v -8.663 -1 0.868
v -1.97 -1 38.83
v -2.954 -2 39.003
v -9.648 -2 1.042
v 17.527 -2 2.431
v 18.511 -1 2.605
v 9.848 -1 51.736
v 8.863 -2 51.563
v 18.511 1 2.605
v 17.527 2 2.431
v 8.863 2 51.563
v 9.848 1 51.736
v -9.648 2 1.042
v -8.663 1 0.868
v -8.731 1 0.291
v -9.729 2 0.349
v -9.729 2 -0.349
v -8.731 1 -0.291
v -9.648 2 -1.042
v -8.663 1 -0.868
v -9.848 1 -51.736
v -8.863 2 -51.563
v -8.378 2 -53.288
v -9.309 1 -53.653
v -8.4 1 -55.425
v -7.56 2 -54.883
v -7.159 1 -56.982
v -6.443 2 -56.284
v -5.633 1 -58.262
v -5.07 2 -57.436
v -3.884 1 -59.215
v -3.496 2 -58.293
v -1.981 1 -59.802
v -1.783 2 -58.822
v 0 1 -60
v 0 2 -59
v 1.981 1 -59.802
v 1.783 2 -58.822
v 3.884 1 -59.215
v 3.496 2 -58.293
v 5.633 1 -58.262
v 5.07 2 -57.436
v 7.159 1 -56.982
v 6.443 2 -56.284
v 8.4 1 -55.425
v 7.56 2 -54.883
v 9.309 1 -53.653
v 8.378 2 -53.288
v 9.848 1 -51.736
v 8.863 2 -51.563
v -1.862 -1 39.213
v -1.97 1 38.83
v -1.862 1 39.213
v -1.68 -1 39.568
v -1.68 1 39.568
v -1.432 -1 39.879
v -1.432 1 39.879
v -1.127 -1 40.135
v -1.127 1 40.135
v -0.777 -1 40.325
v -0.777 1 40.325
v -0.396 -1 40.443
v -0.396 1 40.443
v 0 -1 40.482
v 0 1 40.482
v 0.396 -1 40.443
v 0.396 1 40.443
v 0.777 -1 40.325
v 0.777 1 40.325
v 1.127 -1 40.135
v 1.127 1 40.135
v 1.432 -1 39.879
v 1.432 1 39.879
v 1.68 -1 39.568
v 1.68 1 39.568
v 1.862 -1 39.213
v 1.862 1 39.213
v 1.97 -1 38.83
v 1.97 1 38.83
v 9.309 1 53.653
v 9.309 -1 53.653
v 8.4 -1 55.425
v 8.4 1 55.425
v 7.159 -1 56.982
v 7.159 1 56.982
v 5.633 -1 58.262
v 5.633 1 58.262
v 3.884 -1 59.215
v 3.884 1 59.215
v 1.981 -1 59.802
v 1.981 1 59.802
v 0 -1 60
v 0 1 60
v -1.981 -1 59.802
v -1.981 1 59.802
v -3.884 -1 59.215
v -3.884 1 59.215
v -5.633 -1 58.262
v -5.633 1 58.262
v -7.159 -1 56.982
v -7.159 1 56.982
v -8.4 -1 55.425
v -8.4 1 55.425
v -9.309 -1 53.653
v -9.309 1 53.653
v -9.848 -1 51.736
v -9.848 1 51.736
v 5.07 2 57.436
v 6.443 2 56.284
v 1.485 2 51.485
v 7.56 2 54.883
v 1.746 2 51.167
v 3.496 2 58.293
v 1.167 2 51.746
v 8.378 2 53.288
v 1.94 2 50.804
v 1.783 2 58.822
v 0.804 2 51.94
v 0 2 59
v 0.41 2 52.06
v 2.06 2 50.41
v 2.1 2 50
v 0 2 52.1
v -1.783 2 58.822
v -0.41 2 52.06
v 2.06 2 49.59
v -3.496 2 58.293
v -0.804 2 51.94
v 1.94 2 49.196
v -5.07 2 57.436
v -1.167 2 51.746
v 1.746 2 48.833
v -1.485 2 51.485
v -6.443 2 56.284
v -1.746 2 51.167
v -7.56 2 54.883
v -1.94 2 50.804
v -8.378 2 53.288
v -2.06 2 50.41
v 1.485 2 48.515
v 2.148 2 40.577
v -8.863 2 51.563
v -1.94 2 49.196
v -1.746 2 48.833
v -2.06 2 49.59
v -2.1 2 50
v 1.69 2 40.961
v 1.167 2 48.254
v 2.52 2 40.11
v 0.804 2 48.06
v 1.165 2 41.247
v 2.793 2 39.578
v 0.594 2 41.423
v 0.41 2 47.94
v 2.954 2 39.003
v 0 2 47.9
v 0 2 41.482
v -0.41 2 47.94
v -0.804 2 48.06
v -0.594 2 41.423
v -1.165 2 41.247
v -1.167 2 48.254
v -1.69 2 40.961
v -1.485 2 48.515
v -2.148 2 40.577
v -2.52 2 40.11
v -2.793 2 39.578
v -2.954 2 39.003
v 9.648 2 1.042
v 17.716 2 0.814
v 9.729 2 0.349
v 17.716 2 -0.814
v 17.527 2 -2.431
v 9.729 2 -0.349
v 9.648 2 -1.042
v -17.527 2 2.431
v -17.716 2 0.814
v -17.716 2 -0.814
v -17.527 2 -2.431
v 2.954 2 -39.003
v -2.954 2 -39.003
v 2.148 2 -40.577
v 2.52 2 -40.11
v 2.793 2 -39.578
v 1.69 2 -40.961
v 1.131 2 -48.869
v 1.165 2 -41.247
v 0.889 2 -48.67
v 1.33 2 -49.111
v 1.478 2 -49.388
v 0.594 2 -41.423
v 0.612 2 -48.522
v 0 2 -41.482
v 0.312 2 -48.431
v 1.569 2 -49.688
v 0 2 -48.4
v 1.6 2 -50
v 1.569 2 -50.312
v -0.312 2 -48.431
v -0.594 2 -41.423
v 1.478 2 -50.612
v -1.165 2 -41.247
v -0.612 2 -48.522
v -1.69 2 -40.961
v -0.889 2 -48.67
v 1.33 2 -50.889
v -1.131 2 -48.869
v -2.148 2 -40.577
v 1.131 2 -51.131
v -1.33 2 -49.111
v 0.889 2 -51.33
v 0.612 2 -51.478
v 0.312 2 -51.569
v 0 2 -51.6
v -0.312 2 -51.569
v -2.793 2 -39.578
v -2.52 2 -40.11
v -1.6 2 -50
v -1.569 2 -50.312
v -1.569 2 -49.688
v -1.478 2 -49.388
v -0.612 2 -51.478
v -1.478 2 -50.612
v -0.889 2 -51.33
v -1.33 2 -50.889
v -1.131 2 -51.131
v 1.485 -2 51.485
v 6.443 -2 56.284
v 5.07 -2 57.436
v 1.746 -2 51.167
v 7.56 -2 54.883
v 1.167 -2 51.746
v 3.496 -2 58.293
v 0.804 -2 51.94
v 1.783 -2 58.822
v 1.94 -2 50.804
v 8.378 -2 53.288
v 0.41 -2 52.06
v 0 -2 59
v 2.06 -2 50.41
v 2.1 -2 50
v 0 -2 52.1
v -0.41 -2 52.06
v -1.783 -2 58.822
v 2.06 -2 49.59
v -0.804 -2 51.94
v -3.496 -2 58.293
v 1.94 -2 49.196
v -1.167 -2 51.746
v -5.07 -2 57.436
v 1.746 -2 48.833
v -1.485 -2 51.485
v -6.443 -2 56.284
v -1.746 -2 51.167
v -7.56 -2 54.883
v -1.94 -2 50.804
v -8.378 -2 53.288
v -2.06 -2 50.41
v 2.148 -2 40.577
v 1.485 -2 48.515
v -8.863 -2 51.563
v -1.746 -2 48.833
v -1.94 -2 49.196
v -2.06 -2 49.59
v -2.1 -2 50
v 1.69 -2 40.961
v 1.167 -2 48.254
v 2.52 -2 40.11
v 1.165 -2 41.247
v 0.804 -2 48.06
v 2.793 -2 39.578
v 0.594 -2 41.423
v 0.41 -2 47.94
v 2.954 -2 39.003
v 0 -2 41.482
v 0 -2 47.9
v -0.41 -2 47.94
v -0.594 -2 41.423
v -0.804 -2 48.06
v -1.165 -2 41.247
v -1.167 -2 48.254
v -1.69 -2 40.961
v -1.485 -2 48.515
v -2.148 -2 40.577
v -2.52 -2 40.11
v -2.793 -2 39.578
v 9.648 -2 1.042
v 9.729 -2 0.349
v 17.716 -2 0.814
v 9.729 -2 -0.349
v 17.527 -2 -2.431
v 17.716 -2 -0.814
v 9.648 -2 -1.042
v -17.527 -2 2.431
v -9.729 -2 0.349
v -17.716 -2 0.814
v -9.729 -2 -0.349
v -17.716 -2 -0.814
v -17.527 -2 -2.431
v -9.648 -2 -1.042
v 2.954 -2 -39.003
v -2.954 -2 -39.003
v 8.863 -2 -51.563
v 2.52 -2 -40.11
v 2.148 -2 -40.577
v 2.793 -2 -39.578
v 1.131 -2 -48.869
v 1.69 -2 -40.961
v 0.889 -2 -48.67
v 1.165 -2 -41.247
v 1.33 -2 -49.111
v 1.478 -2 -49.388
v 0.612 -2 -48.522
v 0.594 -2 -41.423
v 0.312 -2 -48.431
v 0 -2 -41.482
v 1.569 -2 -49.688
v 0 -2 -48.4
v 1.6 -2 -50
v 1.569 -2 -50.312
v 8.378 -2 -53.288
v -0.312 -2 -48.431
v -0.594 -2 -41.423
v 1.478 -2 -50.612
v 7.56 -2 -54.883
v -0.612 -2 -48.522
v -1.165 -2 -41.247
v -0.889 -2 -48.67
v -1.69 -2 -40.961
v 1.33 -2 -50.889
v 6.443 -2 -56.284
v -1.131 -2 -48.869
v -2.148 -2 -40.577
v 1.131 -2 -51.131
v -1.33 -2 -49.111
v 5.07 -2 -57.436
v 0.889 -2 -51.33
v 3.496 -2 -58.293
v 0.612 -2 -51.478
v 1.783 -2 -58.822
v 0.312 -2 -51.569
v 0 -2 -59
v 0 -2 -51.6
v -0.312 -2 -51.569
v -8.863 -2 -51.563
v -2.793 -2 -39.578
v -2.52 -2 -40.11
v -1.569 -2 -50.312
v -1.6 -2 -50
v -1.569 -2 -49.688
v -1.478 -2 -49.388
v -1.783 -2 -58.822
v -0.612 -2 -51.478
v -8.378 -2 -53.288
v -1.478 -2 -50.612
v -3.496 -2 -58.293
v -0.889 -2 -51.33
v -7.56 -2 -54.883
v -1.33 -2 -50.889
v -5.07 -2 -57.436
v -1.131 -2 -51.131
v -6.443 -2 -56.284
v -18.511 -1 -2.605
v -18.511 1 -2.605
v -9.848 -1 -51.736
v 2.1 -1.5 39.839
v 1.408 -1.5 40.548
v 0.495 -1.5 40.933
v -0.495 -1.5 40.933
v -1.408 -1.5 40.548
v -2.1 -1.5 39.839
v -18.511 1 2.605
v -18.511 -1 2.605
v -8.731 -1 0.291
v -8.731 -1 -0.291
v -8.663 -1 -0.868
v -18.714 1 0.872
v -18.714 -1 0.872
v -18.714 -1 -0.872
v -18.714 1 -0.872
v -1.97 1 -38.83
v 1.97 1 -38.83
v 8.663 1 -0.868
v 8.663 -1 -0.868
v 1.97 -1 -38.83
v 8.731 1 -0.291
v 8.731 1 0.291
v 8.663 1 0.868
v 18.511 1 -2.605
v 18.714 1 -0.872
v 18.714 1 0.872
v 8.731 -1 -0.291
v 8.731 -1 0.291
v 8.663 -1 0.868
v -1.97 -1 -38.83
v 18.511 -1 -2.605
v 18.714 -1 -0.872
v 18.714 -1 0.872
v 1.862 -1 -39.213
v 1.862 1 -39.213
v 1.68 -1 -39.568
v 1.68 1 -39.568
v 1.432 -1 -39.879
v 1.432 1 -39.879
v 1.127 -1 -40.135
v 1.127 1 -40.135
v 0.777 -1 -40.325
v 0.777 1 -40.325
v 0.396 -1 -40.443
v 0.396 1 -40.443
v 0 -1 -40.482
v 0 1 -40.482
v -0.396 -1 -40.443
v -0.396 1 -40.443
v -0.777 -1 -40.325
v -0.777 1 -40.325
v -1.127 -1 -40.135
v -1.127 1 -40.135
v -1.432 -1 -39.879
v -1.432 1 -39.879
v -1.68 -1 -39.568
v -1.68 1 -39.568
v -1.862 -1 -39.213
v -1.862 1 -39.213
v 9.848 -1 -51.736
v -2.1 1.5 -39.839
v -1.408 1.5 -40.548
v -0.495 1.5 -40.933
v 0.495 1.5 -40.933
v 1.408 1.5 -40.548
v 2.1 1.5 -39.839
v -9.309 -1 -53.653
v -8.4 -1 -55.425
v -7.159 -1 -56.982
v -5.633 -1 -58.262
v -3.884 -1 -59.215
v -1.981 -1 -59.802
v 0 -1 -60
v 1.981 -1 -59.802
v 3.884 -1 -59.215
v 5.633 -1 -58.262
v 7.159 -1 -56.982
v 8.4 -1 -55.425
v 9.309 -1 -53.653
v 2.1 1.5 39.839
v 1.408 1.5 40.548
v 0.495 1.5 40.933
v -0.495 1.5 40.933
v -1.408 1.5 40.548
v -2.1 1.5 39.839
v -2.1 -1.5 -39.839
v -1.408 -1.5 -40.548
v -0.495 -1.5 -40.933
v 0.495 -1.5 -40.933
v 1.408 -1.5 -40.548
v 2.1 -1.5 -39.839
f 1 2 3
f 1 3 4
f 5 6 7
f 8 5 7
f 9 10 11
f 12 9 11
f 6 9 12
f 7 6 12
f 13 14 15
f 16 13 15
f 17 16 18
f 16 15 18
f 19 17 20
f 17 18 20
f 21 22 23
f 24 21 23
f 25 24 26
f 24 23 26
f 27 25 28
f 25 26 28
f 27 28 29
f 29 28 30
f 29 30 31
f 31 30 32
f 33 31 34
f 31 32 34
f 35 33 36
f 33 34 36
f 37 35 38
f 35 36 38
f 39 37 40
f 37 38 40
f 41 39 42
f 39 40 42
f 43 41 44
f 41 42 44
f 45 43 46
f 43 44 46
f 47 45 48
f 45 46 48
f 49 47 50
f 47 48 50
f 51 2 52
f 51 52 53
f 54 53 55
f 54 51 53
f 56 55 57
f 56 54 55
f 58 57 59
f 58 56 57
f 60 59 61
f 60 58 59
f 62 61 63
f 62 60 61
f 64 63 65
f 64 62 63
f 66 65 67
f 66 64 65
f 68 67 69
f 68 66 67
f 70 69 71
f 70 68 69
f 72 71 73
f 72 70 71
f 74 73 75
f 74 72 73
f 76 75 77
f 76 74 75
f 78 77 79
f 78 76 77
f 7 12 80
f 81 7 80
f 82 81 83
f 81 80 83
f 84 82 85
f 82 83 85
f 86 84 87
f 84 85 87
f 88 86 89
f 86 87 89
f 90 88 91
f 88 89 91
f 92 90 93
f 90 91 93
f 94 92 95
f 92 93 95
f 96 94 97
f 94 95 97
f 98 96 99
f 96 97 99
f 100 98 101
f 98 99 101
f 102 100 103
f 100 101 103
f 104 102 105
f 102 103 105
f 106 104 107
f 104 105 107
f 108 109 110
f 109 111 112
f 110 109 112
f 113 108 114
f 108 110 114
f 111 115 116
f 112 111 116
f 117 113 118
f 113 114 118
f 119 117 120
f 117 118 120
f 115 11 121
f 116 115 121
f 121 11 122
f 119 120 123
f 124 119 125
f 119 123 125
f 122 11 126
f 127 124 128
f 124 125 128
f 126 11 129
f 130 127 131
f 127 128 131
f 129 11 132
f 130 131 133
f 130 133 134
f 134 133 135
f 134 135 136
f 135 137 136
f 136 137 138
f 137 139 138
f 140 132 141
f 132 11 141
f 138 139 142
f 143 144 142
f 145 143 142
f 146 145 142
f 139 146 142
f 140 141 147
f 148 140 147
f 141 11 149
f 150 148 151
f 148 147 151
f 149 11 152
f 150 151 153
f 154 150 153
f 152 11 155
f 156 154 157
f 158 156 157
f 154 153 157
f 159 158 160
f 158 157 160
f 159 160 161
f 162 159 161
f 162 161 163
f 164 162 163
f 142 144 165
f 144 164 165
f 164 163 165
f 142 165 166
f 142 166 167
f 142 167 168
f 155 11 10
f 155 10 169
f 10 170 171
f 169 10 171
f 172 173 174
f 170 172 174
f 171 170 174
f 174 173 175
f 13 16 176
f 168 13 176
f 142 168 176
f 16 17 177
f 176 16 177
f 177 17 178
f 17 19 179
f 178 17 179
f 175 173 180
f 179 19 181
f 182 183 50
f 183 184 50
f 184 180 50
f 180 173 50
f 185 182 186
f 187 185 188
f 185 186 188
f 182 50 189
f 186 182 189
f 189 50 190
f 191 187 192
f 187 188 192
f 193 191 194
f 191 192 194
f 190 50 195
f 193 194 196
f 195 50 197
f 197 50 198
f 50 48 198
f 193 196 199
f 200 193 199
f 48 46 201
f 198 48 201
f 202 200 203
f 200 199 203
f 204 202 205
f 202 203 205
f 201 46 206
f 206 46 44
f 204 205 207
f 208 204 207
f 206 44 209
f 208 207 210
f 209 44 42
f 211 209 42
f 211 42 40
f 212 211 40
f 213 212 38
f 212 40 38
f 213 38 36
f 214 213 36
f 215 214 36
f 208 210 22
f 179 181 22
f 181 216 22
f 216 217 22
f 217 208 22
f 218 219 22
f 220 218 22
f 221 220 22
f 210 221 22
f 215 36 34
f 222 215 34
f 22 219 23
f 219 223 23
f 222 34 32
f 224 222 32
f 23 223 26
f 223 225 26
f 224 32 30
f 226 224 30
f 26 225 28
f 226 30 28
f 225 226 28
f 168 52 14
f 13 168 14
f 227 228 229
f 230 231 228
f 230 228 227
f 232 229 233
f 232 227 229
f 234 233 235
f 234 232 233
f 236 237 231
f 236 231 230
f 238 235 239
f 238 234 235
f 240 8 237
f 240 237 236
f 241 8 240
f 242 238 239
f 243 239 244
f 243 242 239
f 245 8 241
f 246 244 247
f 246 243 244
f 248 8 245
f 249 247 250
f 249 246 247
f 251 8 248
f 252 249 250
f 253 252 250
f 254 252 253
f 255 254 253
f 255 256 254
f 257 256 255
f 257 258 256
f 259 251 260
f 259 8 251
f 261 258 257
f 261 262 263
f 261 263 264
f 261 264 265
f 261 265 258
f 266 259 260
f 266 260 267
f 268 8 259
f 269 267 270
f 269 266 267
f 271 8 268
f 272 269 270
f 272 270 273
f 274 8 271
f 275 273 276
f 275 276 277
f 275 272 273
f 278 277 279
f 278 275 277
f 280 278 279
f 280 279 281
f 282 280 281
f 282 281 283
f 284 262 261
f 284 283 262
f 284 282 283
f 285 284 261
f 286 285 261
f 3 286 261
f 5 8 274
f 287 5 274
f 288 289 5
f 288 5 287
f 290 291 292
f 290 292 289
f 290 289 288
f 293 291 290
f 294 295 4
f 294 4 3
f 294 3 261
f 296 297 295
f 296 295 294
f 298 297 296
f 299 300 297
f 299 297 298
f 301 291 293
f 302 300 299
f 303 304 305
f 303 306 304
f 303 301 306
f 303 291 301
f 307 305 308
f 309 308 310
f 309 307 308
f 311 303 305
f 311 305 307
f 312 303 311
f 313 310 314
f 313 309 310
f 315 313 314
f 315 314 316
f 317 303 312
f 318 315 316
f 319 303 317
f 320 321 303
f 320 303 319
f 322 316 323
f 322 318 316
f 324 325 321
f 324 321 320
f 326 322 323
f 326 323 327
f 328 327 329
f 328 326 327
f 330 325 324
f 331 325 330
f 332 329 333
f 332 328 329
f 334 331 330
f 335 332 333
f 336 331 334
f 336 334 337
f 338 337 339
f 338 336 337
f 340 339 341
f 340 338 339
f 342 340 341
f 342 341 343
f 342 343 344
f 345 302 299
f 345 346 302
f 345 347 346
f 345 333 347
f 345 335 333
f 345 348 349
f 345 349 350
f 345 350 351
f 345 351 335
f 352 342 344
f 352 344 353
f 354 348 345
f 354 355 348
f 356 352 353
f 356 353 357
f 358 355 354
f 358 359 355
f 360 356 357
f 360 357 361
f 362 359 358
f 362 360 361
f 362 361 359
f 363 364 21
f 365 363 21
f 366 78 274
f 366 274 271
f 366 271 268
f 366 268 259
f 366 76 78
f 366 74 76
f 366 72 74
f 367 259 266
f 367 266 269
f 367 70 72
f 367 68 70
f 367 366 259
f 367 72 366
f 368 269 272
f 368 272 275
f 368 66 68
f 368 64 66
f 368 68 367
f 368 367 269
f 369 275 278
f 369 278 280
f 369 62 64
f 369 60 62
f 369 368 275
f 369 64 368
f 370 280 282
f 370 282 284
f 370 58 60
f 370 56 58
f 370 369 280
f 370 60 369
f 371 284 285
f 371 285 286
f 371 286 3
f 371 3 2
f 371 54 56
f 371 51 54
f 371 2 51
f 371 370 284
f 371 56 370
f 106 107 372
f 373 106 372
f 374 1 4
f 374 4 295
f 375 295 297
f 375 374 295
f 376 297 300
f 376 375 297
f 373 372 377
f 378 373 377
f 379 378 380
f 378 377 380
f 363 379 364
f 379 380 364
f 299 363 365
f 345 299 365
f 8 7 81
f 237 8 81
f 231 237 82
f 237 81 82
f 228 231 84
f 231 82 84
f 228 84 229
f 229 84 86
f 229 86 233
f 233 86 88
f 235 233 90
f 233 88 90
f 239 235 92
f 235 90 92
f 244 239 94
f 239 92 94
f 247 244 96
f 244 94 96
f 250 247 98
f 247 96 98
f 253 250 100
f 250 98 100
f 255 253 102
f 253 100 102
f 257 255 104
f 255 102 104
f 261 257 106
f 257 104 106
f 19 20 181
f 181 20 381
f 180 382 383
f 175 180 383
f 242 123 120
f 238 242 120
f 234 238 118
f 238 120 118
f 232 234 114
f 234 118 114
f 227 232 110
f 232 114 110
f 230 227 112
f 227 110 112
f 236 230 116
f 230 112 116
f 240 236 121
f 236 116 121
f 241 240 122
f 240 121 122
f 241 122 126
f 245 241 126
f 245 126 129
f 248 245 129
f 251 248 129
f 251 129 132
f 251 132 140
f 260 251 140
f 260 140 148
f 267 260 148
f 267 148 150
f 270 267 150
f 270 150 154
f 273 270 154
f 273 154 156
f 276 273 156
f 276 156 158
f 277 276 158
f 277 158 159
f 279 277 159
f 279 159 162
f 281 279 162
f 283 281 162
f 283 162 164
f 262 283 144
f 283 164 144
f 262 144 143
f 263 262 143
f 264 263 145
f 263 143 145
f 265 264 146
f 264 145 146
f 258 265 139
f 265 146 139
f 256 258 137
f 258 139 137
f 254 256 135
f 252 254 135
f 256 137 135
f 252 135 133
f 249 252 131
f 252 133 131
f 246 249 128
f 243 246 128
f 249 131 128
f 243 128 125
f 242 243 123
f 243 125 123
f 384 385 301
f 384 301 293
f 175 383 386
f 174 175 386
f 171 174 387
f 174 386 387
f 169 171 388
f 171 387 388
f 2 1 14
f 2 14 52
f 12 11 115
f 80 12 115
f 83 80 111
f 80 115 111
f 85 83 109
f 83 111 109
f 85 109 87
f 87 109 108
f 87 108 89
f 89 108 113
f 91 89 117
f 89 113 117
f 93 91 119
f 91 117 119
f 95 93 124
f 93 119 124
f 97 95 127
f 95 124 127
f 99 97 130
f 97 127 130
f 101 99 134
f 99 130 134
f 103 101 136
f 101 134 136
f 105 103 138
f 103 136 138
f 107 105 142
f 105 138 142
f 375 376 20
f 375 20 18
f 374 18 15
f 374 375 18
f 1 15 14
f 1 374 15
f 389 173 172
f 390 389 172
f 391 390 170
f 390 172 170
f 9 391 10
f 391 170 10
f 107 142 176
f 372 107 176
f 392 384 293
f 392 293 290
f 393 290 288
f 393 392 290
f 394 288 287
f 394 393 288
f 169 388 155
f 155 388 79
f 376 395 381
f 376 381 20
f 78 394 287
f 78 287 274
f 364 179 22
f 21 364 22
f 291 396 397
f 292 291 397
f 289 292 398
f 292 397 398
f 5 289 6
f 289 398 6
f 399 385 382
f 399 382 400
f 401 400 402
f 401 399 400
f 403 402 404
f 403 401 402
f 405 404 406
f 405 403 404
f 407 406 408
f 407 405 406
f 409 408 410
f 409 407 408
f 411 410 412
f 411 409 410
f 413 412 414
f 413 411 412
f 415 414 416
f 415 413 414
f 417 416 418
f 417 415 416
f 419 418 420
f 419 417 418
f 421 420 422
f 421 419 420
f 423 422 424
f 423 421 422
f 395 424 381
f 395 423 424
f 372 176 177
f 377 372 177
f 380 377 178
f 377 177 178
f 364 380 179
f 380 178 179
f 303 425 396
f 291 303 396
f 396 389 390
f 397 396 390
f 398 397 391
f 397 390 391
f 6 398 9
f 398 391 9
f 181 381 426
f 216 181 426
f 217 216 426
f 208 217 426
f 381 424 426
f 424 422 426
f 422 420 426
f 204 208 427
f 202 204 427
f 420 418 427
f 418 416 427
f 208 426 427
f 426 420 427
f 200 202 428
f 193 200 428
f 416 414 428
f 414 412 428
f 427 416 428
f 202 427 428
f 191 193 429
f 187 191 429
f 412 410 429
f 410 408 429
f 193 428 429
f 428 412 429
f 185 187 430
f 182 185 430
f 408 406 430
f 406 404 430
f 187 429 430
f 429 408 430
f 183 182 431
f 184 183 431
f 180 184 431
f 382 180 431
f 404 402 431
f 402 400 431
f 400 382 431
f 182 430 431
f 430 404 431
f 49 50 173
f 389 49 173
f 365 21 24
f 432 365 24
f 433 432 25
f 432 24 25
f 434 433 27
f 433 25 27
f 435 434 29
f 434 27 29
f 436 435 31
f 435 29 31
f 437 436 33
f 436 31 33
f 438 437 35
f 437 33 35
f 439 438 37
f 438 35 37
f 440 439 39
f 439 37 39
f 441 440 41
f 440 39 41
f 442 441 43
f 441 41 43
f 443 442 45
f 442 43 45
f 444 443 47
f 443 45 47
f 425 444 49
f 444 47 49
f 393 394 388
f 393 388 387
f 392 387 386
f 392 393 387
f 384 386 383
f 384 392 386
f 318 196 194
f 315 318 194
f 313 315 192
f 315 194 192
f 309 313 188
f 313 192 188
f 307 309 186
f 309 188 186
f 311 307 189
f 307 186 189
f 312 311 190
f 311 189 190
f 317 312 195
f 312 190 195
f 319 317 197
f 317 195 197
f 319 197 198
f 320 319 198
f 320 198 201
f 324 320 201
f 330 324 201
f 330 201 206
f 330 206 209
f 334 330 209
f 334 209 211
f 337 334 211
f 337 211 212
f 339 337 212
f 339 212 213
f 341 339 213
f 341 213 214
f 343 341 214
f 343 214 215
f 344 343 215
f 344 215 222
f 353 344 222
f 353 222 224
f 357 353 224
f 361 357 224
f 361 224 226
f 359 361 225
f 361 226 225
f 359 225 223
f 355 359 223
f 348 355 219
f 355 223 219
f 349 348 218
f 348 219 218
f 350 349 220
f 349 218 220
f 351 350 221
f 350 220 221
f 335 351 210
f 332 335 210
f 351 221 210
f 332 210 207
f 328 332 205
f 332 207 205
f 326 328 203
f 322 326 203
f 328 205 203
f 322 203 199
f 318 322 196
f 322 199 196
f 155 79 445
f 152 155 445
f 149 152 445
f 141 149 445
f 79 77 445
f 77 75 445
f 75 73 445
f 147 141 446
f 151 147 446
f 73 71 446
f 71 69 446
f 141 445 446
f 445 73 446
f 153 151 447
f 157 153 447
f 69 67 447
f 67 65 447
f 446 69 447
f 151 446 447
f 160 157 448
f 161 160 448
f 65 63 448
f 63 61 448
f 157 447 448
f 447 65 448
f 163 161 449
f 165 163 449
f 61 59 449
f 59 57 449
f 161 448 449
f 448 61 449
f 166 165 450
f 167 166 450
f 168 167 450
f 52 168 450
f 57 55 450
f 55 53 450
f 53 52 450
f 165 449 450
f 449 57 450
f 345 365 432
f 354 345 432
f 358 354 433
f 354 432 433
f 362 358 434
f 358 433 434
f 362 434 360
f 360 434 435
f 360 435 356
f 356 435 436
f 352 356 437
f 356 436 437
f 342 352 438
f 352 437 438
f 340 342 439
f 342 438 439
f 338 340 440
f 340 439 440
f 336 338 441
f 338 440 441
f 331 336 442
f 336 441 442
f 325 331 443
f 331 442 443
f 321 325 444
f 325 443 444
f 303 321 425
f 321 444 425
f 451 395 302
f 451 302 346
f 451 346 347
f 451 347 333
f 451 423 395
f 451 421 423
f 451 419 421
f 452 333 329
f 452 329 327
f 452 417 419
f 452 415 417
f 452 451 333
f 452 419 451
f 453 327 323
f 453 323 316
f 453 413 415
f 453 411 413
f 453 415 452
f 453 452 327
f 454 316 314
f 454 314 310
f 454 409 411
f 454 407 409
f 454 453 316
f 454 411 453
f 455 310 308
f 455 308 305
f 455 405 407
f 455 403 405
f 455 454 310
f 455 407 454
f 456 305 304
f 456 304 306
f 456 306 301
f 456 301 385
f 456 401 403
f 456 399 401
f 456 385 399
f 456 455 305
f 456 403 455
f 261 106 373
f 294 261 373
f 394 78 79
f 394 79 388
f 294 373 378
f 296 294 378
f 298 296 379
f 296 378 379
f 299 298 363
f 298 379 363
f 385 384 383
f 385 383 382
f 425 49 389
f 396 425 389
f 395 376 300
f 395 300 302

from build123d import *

# Parameters (mm, degrees)
EXTRUDE_1_DEPTH          = 2
SKETCH_2_R               = 1.6
SKETCH_2_R_2             = 2.1
CUT_EXTRUDE_1_DEPTH      = 63.985380966
CUT_EXTRUDE_4_DEPTH      = 63.89004862
CUT_EXTRUDE_4_DEPTH_BACK = 63.89004862
CHAMFER_1_SIZE           = 1


with BuildPart() as part:
    # 草图1 → 凸台-拉伸1 (new, symmetric)
    with BuildSketch(Plane(origin=(0, 0, 0), x_dir=(1, 0, 0), z_dir=(0, 1, 0))):
        with BuildLine():
            Line((-18.511332271, 2.604722665), (-9.84807753, 51.736481777))
            ThreePointArc((-9.84807753, 51.736481777), (0, 60), (9.84807753, 51.736481777))
            Line((9.84807753, 51.736481777), (18.511332271, 2.604722665))
            ThreePointArc((18.511332271, 2.604722665), (18.739215976, 0), (18.511332271, -2.604722665))
            Line((18.511332271, -2.604722665), (9.84807753, -51.736481777))
            ThreePointArc((9.84807753, -51.736481777), (0, -60), (-9.84807753, -51.736481777))
            Line((-9.84807753, -51.736481777), (-18.511332271, -2.604722665))
            ThreePointArc((-18.511332271, -2.604722665), (-18.739215976, 0), (-18.511332271, 2.604722665))
        make_face()
    extrude(amount=EXTRUDE_1_DEPTH, both=True)

    # 草图2 → 切除-拉伸1 (cut, through all)
    with BuildSketch(Plane(origin=(0, 2, 0), x_dir=(1, 0, 0), z_dir=(0, 1, 0))):
        with Locations(Location((0, 50, 0), (0, 0, 270))):
            Circle(SKETCH_2_R)
        with Locations(Location((0, -50, 0), (0, 0, 270))):
            Circle(SKETCH_2_R_2)
    extrude(amount=-CUT_EXTRUDE_1_DEPTH, mode=Mode.SUBTRACT)

    # 草图6 → 切除-拉伸4 (cut, two sides: drawn at the far end of the back side and taken through both)
    with BuildSketch(Plane(origin=(0, 0, 0), x_dir=(1, 0, 0), z_dir=(0, 1, 0)).offset(-CUT_EXTRUDE_4_DEPTH_BACK)):
        with BuildLine():
            Line((-1.969615506, 38.829755389), (-8.663254741, 0.868240888))
            ThreePointArc((-8.663254741, 0.868240888), (-8.739215976, 0), (-8.663254741, -0.868240888))
            Line((-8.663254741, -0.868240888), (-1.969615506, -38.829755389))
            ThreePointArc((-1.969615506, -38.829755389), (0, -40.482459034), (1.969615506, -38.829755389))
            Line((1.969615506, -38.829755389), (8.663254741, -0.868240888))
            ThreePointArc((8.663254741, -0.868240888), (8.739215976, 0), (8.663254741, 0.868240888))
            Line((8.663254741, 0.868240888), (1.969615506, 38.829755389))
            ThreePointArc((1.969615506, 38.829755389), (0, 40.482459034), (-1.969615506, 38.829755389))
        make_face()
    extrude(amount=CUT_EXTRUDE_4_DEPTH + CUT_EXTRUDE_4_DEPTH_BACK, mode=Mode.SUBTRACT)

    # 倒角1
    chamfer_1_edges = [part.edges().sort_by_distance(p)[0] for p in [
        (-14.179704901, -2, 27.170602221),
        (-18.739215976, -2, 0),
        (-14.179704901, -2, -27.170602221),
        (0, -2, -60),
        (-18.739215976, 2, 0),
        (-14.179704901, 2, 27.170602221),
        (0, 2, 60),
        (14.179704901, 2, 27.170602221),
        (18.739215976, 2, 0),
        (14.179704901, 2, -27.170602221),
        (0, -2, 40.482459034),
        (-5.316435124, -2, 19.848998139),
        (-8.739215976, -2, 0),
        (-5.316435124, -2, -19.848998139),
        (0, -2, -40.482459034),
        (5.316435124, -2, -19.848998139),
        (8.739215976, -2, 0),
        (5.316435124, -2, 19.848998139),
        (0, 2, 40.482459034),
        (5.316435124, 2, 19.848998139),
        (8.739215976, 2, 0),
        (5.316435124, 2, -19.848998139),
        (0, 2, -40.482459034),
        (-5.316435124, 2, -19.848998139),
        (-8.739215976, 2, 0),
        (-5.316435124, 2, 19.848998139),
        (0, 2, -60),
        (14.179704901, -2, -27.170602221),
        (-14.179704901, 2, -27.170602221),
        (18.739215976, -2, 0),
        (14.179704901, -2, 27.170602221),
        (0, -2, 60),
    ]]
    chamfer(chamfer_1_edges, length=CHAMFER_1_SIZE)


solid = part.part
